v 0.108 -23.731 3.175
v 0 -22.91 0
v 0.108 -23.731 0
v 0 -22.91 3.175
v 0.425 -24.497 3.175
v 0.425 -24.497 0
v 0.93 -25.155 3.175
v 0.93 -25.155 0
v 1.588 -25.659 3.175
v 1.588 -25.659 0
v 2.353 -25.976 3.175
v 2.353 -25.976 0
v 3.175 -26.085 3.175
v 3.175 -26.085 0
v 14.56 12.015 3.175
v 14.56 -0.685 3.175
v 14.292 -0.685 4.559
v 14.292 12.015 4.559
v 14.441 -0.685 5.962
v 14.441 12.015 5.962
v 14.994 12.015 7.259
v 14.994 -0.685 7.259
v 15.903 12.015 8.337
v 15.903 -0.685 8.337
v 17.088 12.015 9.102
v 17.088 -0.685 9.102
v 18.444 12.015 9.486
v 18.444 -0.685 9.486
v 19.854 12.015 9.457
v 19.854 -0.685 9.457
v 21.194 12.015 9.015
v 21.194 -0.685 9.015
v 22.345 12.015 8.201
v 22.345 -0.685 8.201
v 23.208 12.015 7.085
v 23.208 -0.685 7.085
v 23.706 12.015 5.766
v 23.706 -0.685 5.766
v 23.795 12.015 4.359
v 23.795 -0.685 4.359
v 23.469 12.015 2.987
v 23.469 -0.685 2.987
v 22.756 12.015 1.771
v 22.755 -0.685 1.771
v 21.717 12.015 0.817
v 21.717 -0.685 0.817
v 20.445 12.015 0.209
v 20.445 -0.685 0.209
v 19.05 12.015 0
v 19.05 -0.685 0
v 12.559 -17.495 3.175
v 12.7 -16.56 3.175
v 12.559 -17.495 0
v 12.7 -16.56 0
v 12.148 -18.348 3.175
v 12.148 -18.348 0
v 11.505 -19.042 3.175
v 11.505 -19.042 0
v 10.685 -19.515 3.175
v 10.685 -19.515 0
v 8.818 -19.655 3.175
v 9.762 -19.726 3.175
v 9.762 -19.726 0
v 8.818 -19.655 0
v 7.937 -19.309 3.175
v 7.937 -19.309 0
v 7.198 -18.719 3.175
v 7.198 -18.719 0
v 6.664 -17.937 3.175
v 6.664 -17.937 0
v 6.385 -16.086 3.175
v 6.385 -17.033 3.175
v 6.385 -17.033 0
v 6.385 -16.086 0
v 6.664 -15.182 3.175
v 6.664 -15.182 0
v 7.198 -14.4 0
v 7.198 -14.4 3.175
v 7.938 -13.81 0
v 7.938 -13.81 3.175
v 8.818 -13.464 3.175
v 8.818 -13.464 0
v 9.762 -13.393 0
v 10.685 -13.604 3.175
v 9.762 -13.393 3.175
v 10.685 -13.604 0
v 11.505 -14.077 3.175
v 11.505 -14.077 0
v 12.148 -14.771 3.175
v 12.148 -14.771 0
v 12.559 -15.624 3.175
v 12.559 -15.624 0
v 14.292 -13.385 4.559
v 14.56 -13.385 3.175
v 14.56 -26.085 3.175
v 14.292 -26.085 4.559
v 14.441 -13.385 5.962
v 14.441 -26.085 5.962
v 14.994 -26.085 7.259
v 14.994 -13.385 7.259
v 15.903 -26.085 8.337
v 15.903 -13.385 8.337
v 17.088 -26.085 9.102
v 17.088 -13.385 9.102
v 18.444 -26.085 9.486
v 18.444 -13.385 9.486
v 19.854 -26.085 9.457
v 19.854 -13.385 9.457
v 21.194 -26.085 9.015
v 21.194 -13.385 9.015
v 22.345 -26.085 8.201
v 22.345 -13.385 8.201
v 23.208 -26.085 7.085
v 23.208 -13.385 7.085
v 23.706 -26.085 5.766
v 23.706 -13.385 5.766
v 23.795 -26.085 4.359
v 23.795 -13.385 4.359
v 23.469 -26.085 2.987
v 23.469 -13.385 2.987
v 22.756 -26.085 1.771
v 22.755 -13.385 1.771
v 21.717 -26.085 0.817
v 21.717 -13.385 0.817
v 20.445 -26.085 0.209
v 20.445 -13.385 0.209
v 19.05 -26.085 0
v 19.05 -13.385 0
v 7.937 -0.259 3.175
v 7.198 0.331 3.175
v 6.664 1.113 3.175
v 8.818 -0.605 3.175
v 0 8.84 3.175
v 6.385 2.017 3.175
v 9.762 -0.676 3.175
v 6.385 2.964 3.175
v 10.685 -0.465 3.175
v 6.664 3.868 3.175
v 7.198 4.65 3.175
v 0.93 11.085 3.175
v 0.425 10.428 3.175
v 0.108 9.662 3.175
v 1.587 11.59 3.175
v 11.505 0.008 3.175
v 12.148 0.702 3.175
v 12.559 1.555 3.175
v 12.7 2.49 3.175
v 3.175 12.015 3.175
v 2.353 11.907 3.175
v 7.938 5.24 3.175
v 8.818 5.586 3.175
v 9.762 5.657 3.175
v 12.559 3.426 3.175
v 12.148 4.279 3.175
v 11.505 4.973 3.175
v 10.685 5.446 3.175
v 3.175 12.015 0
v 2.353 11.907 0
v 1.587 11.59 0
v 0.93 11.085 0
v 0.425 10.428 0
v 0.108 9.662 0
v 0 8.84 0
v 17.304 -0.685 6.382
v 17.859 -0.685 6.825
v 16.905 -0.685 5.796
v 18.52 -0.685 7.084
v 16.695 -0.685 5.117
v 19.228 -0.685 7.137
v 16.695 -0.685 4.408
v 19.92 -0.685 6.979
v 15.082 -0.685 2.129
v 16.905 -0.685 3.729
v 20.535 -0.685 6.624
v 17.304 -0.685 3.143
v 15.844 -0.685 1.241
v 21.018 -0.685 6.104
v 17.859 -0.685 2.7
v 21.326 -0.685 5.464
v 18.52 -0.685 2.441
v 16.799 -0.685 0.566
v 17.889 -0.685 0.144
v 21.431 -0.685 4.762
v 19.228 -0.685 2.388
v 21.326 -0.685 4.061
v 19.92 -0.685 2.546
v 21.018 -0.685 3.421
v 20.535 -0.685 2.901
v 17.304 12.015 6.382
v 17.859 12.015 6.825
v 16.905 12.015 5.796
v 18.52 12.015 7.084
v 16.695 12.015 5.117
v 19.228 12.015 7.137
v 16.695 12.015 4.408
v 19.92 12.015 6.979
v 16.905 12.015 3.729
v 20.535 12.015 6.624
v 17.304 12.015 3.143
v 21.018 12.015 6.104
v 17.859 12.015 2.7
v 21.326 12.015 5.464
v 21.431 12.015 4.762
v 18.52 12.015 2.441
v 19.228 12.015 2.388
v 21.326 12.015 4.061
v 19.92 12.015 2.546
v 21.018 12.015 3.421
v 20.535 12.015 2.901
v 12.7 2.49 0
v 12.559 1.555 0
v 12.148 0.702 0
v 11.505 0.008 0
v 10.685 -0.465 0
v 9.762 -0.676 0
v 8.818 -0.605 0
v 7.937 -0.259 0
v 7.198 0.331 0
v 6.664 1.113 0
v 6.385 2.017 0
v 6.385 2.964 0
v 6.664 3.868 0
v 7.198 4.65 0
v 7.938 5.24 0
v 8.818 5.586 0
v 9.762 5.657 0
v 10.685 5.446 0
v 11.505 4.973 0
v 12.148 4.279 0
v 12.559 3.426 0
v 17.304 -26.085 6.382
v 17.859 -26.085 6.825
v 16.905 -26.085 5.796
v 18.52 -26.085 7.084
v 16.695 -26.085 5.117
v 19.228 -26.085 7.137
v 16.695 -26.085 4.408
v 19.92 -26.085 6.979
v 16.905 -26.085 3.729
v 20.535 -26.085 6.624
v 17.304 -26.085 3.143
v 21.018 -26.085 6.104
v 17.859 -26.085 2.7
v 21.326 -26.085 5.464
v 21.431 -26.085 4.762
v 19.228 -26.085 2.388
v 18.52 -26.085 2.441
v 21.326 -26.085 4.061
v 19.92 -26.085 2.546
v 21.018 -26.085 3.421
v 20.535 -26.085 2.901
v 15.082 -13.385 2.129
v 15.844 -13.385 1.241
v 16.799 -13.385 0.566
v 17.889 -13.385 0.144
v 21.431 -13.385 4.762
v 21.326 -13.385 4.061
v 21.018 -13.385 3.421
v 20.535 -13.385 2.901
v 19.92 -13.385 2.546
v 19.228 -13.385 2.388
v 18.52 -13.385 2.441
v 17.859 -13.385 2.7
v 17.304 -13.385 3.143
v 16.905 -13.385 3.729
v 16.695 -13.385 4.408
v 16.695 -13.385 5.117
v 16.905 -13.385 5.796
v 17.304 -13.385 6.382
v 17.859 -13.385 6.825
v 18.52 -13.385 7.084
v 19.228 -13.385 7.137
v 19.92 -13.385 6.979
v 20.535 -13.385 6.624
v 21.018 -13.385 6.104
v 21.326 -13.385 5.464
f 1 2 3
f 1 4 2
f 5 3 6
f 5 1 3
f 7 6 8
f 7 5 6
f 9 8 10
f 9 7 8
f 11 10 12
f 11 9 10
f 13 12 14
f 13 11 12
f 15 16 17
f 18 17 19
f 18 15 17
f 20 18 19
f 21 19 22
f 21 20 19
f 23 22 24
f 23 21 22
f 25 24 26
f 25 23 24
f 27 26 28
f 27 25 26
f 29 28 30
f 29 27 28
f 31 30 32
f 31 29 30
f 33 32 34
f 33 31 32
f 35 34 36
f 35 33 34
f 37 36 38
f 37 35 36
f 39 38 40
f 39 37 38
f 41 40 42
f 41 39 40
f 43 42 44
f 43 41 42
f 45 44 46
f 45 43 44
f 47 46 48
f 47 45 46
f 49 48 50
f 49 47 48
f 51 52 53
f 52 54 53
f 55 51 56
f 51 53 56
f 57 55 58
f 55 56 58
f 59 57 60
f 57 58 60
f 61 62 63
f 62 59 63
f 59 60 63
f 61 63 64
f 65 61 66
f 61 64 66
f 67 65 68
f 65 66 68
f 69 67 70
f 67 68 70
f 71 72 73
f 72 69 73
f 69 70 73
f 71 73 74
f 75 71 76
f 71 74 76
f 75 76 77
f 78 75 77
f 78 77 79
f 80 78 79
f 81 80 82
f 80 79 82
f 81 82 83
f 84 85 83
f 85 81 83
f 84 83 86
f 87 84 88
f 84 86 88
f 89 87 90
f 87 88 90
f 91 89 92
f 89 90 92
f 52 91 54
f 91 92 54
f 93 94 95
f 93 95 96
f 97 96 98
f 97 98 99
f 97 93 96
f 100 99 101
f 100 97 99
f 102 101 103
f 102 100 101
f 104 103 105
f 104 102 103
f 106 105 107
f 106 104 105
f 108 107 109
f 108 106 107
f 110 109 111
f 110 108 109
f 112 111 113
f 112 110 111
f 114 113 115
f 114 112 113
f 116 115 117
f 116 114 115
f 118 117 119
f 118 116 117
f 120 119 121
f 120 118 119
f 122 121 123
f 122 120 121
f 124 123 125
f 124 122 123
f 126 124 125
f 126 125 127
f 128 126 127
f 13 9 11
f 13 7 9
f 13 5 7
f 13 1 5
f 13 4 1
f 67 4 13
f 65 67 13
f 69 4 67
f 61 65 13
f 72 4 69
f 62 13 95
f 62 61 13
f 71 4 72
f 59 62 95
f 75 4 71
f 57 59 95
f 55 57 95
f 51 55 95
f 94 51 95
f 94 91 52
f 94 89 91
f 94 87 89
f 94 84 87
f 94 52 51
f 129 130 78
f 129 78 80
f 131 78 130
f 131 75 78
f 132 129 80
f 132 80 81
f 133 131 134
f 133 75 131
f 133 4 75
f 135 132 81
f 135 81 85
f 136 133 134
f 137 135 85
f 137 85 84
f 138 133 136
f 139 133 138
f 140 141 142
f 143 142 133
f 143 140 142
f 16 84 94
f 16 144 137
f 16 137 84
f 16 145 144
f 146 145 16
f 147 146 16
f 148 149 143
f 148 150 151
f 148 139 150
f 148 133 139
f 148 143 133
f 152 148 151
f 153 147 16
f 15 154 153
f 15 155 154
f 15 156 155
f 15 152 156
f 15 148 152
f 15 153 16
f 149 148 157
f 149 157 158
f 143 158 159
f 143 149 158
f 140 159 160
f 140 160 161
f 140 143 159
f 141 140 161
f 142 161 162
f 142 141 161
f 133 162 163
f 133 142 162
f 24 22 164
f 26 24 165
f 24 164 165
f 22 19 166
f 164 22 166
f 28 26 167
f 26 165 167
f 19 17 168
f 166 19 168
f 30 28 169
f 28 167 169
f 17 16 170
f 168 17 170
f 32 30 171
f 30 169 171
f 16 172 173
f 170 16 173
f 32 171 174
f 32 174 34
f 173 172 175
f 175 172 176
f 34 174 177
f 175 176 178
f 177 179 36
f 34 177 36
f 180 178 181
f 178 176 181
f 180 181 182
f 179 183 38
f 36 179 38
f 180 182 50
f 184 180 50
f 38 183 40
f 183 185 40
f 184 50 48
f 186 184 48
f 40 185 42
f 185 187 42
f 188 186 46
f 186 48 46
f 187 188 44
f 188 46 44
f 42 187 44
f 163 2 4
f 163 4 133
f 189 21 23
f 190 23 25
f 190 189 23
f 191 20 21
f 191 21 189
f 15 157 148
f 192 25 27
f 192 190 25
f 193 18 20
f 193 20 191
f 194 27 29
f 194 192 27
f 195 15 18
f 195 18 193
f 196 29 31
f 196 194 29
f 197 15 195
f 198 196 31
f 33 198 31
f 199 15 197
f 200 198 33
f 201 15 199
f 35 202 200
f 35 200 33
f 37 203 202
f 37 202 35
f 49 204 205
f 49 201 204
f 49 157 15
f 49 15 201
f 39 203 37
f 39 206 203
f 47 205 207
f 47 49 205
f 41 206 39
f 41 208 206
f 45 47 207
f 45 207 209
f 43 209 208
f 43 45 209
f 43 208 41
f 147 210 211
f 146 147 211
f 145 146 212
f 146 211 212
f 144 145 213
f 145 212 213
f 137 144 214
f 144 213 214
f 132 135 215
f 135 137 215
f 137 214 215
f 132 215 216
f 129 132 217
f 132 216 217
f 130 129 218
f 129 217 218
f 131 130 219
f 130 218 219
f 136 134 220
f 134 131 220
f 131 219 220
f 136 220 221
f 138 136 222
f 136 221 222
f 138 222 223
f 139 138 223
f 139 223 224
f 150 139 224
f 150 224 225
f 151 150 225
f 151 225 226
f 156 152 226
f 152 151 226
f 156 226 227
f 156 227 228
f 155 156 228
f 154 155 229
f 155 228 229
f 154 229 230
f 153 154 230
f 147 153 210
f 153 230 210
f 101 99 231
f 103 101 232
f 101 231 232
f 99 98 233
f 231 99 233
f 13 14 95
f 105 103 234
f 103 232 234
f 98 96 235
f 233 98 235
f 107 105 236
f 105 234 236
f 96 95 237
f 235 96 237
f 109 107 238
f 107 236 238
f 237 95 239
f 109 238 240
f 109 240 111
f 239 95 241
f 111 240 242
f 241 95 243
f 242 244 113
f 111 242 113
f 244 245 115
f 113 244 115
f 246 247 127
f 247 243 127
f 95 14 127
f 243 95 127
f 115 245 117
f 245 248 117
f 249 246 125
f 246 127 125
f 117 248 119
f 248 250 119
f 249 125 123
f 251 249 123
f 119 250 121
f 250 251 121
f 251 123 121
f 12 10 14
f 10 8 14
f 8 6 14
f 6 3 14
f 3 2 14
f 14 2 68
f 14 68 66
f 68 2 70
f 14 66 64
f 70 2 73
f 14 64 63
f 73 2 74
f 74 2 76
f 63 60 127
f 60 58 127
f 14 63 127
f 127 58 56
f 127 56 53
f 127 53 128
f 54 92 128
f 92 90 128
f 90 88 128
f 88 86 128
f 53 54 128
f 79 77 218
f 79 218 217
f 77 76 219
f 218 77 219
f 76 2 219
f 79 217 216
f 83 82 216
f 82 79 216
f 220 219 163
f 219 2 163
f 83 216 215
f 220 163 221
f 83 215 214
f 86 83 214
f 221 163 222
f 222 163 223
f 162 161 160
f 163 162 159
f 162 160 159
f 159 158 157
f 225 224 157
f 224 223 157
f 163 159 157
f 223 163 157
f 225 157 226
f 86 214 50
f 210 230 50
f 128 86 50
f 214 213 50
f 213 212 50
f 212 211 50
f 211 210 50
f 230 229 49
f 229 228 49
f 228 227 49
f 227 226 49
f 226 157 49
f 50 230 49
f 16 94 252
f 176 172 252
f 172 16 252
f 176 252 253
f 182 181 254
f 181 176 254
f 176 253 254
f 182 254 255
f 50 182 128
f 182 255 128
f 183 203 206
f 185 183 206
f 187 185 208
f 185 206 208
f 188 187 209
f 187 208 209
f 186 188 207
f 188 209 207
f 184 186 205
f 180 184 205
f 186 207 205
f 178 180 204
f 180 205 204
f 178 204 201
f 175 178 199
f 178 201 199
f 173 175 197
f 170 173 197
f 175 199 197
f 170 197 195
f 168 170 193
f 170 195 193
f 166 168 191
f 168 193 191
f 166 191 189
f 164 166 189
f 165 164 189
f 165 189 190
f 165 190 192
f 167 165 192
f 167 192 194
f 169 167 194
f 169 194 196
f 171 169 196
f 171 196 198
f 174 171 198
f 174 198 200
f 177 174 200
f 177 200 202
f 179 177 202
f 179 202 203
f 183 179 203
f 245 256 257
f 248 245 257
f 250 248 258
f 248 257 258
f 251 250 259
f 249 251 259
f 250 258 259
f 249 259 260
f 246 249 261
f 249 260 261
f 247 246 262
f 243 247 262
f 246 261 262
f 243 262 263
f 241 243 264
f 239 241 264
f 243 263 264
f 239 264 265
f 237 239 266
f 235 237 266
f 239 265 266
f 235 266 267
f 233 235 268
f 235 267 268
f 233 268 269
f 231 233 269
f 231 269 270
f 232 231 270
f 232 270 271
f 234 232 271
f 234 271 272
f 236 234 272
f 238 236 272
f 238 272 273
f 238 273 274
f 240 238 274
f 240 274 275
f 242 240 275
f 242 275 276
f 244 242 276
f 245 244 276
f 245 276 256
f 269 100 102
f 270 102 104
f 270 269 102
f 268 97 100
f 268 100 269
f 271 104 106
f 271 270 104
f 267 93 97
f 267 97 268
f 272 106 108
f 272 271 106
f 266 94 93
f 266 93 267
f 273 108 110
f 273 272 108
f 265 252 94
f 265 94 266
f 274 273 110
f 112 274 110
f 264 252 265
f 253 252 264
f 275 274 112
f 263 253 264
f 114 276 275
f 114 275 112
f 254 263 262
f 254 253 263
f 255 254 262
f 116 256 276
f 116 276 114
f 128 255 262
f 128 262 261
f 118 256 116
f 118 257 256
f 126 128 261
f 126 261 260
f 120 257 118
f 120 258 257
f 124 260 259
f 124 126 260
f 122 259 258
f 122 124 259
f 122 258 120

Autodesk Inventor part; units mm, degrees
ref_plane "YZ Plane" through (0, 0, 0) normal (1, 0, 0) x (0, 1, 0)
ref_plane "XZ Plane" through (0, 0, 0) normal (0, 1, 0) x (-1, 0, 0)
sketch "Sketch1" plane through (0, 0, 0) normal (0, 0, 1) x (1, 0, 0)
  line L0 (0, 12.0154) -> (19.05, 12.0154)
  line L1 (19.05, 12.0154) -> (19.05, -26.0846)
  line L2 (19.05, -26.0846) -> (0, -26.0846)
  line L3 (0, -26.0846) -> (0, 12.0154)
  circle A0 centre (9.525, 2.4904) radius 3.175
  circle A1 centre (9.525, -16.5596) radius 3.175
  point P0 (0, 0)
  dimension "d0" = 19.05
  dimension "d1" = 38.1
  dimension "d2" = 6.35
  dimension "d3" = 6.35
  dimension "d4" = 19.05
  dimension "d5" = 9.525
  dimension "d6" = 9.525
extrude "Extrusion1" add sketch "Sketch1" along normal blind 3.175
fillet "Fillet1" radius 3.175 2 edges at (0, 12.0154, 1.5875) (0, -26.0846, 1.5875)
sketch "Sketch2" plane through (19.05, 12.0154, 3.175) normal (0, 1, 0) x (1, 0, 0)
  circle A0 centre (0, -1.5875) radius 4.7625
  circle A1 centre (0, -1.5875) radius 4.7625
  line L0 (-15.875, 3.175) -> (0, 3.175) projected
  point P0 (-19.05, 3.175)
extrude "Extrusion2" add sketch "Sketch2" against normal blind 38.1
ref_plane "Work Plane1" through (3.175, -7.0346, 3.175) normal (0, 1, 0) x (1, 0, 0)
sketch "Sketch3" plane through (3.175, -7.0346, 3.175) normal (0, 1, 0) x (1, 0, 0)
  arc A0 (11.3849, 0) -> (15.875, 3.175) centre (15.875, -1.5875) ccw projected
  circle A1 centre (15.875, -1.5875) radius 4.7625
  point P0 (-3.175, 3.175)
extrude "Extrusion3" cut sketch "Sketch3" along normal mid plane 12.7
sketch "Sketch5" plane through (3.175, 12.0154, 3.175) normal (0, 1, 0) x (1, 0, 0)
  circle A0 centre (15.875, -1.5875) radius 2.3813
  point P0 (-3.175, 3.175)
  point P1 (15.875, -1.5875)
  dimension "d16" = 4.7625
extrude "Extrusion4" cut sketch "Sketch5" against normal blind 38.1
equation "\"d3\" = d2"
equation "\"d4\" = 0.5 * d1"
equation "\"d5\" = 0.25 * d1"
equation "\"d6\" = 0.5 * d0"
properties part number "hinge left" material "Brass, Soft Yellow"
